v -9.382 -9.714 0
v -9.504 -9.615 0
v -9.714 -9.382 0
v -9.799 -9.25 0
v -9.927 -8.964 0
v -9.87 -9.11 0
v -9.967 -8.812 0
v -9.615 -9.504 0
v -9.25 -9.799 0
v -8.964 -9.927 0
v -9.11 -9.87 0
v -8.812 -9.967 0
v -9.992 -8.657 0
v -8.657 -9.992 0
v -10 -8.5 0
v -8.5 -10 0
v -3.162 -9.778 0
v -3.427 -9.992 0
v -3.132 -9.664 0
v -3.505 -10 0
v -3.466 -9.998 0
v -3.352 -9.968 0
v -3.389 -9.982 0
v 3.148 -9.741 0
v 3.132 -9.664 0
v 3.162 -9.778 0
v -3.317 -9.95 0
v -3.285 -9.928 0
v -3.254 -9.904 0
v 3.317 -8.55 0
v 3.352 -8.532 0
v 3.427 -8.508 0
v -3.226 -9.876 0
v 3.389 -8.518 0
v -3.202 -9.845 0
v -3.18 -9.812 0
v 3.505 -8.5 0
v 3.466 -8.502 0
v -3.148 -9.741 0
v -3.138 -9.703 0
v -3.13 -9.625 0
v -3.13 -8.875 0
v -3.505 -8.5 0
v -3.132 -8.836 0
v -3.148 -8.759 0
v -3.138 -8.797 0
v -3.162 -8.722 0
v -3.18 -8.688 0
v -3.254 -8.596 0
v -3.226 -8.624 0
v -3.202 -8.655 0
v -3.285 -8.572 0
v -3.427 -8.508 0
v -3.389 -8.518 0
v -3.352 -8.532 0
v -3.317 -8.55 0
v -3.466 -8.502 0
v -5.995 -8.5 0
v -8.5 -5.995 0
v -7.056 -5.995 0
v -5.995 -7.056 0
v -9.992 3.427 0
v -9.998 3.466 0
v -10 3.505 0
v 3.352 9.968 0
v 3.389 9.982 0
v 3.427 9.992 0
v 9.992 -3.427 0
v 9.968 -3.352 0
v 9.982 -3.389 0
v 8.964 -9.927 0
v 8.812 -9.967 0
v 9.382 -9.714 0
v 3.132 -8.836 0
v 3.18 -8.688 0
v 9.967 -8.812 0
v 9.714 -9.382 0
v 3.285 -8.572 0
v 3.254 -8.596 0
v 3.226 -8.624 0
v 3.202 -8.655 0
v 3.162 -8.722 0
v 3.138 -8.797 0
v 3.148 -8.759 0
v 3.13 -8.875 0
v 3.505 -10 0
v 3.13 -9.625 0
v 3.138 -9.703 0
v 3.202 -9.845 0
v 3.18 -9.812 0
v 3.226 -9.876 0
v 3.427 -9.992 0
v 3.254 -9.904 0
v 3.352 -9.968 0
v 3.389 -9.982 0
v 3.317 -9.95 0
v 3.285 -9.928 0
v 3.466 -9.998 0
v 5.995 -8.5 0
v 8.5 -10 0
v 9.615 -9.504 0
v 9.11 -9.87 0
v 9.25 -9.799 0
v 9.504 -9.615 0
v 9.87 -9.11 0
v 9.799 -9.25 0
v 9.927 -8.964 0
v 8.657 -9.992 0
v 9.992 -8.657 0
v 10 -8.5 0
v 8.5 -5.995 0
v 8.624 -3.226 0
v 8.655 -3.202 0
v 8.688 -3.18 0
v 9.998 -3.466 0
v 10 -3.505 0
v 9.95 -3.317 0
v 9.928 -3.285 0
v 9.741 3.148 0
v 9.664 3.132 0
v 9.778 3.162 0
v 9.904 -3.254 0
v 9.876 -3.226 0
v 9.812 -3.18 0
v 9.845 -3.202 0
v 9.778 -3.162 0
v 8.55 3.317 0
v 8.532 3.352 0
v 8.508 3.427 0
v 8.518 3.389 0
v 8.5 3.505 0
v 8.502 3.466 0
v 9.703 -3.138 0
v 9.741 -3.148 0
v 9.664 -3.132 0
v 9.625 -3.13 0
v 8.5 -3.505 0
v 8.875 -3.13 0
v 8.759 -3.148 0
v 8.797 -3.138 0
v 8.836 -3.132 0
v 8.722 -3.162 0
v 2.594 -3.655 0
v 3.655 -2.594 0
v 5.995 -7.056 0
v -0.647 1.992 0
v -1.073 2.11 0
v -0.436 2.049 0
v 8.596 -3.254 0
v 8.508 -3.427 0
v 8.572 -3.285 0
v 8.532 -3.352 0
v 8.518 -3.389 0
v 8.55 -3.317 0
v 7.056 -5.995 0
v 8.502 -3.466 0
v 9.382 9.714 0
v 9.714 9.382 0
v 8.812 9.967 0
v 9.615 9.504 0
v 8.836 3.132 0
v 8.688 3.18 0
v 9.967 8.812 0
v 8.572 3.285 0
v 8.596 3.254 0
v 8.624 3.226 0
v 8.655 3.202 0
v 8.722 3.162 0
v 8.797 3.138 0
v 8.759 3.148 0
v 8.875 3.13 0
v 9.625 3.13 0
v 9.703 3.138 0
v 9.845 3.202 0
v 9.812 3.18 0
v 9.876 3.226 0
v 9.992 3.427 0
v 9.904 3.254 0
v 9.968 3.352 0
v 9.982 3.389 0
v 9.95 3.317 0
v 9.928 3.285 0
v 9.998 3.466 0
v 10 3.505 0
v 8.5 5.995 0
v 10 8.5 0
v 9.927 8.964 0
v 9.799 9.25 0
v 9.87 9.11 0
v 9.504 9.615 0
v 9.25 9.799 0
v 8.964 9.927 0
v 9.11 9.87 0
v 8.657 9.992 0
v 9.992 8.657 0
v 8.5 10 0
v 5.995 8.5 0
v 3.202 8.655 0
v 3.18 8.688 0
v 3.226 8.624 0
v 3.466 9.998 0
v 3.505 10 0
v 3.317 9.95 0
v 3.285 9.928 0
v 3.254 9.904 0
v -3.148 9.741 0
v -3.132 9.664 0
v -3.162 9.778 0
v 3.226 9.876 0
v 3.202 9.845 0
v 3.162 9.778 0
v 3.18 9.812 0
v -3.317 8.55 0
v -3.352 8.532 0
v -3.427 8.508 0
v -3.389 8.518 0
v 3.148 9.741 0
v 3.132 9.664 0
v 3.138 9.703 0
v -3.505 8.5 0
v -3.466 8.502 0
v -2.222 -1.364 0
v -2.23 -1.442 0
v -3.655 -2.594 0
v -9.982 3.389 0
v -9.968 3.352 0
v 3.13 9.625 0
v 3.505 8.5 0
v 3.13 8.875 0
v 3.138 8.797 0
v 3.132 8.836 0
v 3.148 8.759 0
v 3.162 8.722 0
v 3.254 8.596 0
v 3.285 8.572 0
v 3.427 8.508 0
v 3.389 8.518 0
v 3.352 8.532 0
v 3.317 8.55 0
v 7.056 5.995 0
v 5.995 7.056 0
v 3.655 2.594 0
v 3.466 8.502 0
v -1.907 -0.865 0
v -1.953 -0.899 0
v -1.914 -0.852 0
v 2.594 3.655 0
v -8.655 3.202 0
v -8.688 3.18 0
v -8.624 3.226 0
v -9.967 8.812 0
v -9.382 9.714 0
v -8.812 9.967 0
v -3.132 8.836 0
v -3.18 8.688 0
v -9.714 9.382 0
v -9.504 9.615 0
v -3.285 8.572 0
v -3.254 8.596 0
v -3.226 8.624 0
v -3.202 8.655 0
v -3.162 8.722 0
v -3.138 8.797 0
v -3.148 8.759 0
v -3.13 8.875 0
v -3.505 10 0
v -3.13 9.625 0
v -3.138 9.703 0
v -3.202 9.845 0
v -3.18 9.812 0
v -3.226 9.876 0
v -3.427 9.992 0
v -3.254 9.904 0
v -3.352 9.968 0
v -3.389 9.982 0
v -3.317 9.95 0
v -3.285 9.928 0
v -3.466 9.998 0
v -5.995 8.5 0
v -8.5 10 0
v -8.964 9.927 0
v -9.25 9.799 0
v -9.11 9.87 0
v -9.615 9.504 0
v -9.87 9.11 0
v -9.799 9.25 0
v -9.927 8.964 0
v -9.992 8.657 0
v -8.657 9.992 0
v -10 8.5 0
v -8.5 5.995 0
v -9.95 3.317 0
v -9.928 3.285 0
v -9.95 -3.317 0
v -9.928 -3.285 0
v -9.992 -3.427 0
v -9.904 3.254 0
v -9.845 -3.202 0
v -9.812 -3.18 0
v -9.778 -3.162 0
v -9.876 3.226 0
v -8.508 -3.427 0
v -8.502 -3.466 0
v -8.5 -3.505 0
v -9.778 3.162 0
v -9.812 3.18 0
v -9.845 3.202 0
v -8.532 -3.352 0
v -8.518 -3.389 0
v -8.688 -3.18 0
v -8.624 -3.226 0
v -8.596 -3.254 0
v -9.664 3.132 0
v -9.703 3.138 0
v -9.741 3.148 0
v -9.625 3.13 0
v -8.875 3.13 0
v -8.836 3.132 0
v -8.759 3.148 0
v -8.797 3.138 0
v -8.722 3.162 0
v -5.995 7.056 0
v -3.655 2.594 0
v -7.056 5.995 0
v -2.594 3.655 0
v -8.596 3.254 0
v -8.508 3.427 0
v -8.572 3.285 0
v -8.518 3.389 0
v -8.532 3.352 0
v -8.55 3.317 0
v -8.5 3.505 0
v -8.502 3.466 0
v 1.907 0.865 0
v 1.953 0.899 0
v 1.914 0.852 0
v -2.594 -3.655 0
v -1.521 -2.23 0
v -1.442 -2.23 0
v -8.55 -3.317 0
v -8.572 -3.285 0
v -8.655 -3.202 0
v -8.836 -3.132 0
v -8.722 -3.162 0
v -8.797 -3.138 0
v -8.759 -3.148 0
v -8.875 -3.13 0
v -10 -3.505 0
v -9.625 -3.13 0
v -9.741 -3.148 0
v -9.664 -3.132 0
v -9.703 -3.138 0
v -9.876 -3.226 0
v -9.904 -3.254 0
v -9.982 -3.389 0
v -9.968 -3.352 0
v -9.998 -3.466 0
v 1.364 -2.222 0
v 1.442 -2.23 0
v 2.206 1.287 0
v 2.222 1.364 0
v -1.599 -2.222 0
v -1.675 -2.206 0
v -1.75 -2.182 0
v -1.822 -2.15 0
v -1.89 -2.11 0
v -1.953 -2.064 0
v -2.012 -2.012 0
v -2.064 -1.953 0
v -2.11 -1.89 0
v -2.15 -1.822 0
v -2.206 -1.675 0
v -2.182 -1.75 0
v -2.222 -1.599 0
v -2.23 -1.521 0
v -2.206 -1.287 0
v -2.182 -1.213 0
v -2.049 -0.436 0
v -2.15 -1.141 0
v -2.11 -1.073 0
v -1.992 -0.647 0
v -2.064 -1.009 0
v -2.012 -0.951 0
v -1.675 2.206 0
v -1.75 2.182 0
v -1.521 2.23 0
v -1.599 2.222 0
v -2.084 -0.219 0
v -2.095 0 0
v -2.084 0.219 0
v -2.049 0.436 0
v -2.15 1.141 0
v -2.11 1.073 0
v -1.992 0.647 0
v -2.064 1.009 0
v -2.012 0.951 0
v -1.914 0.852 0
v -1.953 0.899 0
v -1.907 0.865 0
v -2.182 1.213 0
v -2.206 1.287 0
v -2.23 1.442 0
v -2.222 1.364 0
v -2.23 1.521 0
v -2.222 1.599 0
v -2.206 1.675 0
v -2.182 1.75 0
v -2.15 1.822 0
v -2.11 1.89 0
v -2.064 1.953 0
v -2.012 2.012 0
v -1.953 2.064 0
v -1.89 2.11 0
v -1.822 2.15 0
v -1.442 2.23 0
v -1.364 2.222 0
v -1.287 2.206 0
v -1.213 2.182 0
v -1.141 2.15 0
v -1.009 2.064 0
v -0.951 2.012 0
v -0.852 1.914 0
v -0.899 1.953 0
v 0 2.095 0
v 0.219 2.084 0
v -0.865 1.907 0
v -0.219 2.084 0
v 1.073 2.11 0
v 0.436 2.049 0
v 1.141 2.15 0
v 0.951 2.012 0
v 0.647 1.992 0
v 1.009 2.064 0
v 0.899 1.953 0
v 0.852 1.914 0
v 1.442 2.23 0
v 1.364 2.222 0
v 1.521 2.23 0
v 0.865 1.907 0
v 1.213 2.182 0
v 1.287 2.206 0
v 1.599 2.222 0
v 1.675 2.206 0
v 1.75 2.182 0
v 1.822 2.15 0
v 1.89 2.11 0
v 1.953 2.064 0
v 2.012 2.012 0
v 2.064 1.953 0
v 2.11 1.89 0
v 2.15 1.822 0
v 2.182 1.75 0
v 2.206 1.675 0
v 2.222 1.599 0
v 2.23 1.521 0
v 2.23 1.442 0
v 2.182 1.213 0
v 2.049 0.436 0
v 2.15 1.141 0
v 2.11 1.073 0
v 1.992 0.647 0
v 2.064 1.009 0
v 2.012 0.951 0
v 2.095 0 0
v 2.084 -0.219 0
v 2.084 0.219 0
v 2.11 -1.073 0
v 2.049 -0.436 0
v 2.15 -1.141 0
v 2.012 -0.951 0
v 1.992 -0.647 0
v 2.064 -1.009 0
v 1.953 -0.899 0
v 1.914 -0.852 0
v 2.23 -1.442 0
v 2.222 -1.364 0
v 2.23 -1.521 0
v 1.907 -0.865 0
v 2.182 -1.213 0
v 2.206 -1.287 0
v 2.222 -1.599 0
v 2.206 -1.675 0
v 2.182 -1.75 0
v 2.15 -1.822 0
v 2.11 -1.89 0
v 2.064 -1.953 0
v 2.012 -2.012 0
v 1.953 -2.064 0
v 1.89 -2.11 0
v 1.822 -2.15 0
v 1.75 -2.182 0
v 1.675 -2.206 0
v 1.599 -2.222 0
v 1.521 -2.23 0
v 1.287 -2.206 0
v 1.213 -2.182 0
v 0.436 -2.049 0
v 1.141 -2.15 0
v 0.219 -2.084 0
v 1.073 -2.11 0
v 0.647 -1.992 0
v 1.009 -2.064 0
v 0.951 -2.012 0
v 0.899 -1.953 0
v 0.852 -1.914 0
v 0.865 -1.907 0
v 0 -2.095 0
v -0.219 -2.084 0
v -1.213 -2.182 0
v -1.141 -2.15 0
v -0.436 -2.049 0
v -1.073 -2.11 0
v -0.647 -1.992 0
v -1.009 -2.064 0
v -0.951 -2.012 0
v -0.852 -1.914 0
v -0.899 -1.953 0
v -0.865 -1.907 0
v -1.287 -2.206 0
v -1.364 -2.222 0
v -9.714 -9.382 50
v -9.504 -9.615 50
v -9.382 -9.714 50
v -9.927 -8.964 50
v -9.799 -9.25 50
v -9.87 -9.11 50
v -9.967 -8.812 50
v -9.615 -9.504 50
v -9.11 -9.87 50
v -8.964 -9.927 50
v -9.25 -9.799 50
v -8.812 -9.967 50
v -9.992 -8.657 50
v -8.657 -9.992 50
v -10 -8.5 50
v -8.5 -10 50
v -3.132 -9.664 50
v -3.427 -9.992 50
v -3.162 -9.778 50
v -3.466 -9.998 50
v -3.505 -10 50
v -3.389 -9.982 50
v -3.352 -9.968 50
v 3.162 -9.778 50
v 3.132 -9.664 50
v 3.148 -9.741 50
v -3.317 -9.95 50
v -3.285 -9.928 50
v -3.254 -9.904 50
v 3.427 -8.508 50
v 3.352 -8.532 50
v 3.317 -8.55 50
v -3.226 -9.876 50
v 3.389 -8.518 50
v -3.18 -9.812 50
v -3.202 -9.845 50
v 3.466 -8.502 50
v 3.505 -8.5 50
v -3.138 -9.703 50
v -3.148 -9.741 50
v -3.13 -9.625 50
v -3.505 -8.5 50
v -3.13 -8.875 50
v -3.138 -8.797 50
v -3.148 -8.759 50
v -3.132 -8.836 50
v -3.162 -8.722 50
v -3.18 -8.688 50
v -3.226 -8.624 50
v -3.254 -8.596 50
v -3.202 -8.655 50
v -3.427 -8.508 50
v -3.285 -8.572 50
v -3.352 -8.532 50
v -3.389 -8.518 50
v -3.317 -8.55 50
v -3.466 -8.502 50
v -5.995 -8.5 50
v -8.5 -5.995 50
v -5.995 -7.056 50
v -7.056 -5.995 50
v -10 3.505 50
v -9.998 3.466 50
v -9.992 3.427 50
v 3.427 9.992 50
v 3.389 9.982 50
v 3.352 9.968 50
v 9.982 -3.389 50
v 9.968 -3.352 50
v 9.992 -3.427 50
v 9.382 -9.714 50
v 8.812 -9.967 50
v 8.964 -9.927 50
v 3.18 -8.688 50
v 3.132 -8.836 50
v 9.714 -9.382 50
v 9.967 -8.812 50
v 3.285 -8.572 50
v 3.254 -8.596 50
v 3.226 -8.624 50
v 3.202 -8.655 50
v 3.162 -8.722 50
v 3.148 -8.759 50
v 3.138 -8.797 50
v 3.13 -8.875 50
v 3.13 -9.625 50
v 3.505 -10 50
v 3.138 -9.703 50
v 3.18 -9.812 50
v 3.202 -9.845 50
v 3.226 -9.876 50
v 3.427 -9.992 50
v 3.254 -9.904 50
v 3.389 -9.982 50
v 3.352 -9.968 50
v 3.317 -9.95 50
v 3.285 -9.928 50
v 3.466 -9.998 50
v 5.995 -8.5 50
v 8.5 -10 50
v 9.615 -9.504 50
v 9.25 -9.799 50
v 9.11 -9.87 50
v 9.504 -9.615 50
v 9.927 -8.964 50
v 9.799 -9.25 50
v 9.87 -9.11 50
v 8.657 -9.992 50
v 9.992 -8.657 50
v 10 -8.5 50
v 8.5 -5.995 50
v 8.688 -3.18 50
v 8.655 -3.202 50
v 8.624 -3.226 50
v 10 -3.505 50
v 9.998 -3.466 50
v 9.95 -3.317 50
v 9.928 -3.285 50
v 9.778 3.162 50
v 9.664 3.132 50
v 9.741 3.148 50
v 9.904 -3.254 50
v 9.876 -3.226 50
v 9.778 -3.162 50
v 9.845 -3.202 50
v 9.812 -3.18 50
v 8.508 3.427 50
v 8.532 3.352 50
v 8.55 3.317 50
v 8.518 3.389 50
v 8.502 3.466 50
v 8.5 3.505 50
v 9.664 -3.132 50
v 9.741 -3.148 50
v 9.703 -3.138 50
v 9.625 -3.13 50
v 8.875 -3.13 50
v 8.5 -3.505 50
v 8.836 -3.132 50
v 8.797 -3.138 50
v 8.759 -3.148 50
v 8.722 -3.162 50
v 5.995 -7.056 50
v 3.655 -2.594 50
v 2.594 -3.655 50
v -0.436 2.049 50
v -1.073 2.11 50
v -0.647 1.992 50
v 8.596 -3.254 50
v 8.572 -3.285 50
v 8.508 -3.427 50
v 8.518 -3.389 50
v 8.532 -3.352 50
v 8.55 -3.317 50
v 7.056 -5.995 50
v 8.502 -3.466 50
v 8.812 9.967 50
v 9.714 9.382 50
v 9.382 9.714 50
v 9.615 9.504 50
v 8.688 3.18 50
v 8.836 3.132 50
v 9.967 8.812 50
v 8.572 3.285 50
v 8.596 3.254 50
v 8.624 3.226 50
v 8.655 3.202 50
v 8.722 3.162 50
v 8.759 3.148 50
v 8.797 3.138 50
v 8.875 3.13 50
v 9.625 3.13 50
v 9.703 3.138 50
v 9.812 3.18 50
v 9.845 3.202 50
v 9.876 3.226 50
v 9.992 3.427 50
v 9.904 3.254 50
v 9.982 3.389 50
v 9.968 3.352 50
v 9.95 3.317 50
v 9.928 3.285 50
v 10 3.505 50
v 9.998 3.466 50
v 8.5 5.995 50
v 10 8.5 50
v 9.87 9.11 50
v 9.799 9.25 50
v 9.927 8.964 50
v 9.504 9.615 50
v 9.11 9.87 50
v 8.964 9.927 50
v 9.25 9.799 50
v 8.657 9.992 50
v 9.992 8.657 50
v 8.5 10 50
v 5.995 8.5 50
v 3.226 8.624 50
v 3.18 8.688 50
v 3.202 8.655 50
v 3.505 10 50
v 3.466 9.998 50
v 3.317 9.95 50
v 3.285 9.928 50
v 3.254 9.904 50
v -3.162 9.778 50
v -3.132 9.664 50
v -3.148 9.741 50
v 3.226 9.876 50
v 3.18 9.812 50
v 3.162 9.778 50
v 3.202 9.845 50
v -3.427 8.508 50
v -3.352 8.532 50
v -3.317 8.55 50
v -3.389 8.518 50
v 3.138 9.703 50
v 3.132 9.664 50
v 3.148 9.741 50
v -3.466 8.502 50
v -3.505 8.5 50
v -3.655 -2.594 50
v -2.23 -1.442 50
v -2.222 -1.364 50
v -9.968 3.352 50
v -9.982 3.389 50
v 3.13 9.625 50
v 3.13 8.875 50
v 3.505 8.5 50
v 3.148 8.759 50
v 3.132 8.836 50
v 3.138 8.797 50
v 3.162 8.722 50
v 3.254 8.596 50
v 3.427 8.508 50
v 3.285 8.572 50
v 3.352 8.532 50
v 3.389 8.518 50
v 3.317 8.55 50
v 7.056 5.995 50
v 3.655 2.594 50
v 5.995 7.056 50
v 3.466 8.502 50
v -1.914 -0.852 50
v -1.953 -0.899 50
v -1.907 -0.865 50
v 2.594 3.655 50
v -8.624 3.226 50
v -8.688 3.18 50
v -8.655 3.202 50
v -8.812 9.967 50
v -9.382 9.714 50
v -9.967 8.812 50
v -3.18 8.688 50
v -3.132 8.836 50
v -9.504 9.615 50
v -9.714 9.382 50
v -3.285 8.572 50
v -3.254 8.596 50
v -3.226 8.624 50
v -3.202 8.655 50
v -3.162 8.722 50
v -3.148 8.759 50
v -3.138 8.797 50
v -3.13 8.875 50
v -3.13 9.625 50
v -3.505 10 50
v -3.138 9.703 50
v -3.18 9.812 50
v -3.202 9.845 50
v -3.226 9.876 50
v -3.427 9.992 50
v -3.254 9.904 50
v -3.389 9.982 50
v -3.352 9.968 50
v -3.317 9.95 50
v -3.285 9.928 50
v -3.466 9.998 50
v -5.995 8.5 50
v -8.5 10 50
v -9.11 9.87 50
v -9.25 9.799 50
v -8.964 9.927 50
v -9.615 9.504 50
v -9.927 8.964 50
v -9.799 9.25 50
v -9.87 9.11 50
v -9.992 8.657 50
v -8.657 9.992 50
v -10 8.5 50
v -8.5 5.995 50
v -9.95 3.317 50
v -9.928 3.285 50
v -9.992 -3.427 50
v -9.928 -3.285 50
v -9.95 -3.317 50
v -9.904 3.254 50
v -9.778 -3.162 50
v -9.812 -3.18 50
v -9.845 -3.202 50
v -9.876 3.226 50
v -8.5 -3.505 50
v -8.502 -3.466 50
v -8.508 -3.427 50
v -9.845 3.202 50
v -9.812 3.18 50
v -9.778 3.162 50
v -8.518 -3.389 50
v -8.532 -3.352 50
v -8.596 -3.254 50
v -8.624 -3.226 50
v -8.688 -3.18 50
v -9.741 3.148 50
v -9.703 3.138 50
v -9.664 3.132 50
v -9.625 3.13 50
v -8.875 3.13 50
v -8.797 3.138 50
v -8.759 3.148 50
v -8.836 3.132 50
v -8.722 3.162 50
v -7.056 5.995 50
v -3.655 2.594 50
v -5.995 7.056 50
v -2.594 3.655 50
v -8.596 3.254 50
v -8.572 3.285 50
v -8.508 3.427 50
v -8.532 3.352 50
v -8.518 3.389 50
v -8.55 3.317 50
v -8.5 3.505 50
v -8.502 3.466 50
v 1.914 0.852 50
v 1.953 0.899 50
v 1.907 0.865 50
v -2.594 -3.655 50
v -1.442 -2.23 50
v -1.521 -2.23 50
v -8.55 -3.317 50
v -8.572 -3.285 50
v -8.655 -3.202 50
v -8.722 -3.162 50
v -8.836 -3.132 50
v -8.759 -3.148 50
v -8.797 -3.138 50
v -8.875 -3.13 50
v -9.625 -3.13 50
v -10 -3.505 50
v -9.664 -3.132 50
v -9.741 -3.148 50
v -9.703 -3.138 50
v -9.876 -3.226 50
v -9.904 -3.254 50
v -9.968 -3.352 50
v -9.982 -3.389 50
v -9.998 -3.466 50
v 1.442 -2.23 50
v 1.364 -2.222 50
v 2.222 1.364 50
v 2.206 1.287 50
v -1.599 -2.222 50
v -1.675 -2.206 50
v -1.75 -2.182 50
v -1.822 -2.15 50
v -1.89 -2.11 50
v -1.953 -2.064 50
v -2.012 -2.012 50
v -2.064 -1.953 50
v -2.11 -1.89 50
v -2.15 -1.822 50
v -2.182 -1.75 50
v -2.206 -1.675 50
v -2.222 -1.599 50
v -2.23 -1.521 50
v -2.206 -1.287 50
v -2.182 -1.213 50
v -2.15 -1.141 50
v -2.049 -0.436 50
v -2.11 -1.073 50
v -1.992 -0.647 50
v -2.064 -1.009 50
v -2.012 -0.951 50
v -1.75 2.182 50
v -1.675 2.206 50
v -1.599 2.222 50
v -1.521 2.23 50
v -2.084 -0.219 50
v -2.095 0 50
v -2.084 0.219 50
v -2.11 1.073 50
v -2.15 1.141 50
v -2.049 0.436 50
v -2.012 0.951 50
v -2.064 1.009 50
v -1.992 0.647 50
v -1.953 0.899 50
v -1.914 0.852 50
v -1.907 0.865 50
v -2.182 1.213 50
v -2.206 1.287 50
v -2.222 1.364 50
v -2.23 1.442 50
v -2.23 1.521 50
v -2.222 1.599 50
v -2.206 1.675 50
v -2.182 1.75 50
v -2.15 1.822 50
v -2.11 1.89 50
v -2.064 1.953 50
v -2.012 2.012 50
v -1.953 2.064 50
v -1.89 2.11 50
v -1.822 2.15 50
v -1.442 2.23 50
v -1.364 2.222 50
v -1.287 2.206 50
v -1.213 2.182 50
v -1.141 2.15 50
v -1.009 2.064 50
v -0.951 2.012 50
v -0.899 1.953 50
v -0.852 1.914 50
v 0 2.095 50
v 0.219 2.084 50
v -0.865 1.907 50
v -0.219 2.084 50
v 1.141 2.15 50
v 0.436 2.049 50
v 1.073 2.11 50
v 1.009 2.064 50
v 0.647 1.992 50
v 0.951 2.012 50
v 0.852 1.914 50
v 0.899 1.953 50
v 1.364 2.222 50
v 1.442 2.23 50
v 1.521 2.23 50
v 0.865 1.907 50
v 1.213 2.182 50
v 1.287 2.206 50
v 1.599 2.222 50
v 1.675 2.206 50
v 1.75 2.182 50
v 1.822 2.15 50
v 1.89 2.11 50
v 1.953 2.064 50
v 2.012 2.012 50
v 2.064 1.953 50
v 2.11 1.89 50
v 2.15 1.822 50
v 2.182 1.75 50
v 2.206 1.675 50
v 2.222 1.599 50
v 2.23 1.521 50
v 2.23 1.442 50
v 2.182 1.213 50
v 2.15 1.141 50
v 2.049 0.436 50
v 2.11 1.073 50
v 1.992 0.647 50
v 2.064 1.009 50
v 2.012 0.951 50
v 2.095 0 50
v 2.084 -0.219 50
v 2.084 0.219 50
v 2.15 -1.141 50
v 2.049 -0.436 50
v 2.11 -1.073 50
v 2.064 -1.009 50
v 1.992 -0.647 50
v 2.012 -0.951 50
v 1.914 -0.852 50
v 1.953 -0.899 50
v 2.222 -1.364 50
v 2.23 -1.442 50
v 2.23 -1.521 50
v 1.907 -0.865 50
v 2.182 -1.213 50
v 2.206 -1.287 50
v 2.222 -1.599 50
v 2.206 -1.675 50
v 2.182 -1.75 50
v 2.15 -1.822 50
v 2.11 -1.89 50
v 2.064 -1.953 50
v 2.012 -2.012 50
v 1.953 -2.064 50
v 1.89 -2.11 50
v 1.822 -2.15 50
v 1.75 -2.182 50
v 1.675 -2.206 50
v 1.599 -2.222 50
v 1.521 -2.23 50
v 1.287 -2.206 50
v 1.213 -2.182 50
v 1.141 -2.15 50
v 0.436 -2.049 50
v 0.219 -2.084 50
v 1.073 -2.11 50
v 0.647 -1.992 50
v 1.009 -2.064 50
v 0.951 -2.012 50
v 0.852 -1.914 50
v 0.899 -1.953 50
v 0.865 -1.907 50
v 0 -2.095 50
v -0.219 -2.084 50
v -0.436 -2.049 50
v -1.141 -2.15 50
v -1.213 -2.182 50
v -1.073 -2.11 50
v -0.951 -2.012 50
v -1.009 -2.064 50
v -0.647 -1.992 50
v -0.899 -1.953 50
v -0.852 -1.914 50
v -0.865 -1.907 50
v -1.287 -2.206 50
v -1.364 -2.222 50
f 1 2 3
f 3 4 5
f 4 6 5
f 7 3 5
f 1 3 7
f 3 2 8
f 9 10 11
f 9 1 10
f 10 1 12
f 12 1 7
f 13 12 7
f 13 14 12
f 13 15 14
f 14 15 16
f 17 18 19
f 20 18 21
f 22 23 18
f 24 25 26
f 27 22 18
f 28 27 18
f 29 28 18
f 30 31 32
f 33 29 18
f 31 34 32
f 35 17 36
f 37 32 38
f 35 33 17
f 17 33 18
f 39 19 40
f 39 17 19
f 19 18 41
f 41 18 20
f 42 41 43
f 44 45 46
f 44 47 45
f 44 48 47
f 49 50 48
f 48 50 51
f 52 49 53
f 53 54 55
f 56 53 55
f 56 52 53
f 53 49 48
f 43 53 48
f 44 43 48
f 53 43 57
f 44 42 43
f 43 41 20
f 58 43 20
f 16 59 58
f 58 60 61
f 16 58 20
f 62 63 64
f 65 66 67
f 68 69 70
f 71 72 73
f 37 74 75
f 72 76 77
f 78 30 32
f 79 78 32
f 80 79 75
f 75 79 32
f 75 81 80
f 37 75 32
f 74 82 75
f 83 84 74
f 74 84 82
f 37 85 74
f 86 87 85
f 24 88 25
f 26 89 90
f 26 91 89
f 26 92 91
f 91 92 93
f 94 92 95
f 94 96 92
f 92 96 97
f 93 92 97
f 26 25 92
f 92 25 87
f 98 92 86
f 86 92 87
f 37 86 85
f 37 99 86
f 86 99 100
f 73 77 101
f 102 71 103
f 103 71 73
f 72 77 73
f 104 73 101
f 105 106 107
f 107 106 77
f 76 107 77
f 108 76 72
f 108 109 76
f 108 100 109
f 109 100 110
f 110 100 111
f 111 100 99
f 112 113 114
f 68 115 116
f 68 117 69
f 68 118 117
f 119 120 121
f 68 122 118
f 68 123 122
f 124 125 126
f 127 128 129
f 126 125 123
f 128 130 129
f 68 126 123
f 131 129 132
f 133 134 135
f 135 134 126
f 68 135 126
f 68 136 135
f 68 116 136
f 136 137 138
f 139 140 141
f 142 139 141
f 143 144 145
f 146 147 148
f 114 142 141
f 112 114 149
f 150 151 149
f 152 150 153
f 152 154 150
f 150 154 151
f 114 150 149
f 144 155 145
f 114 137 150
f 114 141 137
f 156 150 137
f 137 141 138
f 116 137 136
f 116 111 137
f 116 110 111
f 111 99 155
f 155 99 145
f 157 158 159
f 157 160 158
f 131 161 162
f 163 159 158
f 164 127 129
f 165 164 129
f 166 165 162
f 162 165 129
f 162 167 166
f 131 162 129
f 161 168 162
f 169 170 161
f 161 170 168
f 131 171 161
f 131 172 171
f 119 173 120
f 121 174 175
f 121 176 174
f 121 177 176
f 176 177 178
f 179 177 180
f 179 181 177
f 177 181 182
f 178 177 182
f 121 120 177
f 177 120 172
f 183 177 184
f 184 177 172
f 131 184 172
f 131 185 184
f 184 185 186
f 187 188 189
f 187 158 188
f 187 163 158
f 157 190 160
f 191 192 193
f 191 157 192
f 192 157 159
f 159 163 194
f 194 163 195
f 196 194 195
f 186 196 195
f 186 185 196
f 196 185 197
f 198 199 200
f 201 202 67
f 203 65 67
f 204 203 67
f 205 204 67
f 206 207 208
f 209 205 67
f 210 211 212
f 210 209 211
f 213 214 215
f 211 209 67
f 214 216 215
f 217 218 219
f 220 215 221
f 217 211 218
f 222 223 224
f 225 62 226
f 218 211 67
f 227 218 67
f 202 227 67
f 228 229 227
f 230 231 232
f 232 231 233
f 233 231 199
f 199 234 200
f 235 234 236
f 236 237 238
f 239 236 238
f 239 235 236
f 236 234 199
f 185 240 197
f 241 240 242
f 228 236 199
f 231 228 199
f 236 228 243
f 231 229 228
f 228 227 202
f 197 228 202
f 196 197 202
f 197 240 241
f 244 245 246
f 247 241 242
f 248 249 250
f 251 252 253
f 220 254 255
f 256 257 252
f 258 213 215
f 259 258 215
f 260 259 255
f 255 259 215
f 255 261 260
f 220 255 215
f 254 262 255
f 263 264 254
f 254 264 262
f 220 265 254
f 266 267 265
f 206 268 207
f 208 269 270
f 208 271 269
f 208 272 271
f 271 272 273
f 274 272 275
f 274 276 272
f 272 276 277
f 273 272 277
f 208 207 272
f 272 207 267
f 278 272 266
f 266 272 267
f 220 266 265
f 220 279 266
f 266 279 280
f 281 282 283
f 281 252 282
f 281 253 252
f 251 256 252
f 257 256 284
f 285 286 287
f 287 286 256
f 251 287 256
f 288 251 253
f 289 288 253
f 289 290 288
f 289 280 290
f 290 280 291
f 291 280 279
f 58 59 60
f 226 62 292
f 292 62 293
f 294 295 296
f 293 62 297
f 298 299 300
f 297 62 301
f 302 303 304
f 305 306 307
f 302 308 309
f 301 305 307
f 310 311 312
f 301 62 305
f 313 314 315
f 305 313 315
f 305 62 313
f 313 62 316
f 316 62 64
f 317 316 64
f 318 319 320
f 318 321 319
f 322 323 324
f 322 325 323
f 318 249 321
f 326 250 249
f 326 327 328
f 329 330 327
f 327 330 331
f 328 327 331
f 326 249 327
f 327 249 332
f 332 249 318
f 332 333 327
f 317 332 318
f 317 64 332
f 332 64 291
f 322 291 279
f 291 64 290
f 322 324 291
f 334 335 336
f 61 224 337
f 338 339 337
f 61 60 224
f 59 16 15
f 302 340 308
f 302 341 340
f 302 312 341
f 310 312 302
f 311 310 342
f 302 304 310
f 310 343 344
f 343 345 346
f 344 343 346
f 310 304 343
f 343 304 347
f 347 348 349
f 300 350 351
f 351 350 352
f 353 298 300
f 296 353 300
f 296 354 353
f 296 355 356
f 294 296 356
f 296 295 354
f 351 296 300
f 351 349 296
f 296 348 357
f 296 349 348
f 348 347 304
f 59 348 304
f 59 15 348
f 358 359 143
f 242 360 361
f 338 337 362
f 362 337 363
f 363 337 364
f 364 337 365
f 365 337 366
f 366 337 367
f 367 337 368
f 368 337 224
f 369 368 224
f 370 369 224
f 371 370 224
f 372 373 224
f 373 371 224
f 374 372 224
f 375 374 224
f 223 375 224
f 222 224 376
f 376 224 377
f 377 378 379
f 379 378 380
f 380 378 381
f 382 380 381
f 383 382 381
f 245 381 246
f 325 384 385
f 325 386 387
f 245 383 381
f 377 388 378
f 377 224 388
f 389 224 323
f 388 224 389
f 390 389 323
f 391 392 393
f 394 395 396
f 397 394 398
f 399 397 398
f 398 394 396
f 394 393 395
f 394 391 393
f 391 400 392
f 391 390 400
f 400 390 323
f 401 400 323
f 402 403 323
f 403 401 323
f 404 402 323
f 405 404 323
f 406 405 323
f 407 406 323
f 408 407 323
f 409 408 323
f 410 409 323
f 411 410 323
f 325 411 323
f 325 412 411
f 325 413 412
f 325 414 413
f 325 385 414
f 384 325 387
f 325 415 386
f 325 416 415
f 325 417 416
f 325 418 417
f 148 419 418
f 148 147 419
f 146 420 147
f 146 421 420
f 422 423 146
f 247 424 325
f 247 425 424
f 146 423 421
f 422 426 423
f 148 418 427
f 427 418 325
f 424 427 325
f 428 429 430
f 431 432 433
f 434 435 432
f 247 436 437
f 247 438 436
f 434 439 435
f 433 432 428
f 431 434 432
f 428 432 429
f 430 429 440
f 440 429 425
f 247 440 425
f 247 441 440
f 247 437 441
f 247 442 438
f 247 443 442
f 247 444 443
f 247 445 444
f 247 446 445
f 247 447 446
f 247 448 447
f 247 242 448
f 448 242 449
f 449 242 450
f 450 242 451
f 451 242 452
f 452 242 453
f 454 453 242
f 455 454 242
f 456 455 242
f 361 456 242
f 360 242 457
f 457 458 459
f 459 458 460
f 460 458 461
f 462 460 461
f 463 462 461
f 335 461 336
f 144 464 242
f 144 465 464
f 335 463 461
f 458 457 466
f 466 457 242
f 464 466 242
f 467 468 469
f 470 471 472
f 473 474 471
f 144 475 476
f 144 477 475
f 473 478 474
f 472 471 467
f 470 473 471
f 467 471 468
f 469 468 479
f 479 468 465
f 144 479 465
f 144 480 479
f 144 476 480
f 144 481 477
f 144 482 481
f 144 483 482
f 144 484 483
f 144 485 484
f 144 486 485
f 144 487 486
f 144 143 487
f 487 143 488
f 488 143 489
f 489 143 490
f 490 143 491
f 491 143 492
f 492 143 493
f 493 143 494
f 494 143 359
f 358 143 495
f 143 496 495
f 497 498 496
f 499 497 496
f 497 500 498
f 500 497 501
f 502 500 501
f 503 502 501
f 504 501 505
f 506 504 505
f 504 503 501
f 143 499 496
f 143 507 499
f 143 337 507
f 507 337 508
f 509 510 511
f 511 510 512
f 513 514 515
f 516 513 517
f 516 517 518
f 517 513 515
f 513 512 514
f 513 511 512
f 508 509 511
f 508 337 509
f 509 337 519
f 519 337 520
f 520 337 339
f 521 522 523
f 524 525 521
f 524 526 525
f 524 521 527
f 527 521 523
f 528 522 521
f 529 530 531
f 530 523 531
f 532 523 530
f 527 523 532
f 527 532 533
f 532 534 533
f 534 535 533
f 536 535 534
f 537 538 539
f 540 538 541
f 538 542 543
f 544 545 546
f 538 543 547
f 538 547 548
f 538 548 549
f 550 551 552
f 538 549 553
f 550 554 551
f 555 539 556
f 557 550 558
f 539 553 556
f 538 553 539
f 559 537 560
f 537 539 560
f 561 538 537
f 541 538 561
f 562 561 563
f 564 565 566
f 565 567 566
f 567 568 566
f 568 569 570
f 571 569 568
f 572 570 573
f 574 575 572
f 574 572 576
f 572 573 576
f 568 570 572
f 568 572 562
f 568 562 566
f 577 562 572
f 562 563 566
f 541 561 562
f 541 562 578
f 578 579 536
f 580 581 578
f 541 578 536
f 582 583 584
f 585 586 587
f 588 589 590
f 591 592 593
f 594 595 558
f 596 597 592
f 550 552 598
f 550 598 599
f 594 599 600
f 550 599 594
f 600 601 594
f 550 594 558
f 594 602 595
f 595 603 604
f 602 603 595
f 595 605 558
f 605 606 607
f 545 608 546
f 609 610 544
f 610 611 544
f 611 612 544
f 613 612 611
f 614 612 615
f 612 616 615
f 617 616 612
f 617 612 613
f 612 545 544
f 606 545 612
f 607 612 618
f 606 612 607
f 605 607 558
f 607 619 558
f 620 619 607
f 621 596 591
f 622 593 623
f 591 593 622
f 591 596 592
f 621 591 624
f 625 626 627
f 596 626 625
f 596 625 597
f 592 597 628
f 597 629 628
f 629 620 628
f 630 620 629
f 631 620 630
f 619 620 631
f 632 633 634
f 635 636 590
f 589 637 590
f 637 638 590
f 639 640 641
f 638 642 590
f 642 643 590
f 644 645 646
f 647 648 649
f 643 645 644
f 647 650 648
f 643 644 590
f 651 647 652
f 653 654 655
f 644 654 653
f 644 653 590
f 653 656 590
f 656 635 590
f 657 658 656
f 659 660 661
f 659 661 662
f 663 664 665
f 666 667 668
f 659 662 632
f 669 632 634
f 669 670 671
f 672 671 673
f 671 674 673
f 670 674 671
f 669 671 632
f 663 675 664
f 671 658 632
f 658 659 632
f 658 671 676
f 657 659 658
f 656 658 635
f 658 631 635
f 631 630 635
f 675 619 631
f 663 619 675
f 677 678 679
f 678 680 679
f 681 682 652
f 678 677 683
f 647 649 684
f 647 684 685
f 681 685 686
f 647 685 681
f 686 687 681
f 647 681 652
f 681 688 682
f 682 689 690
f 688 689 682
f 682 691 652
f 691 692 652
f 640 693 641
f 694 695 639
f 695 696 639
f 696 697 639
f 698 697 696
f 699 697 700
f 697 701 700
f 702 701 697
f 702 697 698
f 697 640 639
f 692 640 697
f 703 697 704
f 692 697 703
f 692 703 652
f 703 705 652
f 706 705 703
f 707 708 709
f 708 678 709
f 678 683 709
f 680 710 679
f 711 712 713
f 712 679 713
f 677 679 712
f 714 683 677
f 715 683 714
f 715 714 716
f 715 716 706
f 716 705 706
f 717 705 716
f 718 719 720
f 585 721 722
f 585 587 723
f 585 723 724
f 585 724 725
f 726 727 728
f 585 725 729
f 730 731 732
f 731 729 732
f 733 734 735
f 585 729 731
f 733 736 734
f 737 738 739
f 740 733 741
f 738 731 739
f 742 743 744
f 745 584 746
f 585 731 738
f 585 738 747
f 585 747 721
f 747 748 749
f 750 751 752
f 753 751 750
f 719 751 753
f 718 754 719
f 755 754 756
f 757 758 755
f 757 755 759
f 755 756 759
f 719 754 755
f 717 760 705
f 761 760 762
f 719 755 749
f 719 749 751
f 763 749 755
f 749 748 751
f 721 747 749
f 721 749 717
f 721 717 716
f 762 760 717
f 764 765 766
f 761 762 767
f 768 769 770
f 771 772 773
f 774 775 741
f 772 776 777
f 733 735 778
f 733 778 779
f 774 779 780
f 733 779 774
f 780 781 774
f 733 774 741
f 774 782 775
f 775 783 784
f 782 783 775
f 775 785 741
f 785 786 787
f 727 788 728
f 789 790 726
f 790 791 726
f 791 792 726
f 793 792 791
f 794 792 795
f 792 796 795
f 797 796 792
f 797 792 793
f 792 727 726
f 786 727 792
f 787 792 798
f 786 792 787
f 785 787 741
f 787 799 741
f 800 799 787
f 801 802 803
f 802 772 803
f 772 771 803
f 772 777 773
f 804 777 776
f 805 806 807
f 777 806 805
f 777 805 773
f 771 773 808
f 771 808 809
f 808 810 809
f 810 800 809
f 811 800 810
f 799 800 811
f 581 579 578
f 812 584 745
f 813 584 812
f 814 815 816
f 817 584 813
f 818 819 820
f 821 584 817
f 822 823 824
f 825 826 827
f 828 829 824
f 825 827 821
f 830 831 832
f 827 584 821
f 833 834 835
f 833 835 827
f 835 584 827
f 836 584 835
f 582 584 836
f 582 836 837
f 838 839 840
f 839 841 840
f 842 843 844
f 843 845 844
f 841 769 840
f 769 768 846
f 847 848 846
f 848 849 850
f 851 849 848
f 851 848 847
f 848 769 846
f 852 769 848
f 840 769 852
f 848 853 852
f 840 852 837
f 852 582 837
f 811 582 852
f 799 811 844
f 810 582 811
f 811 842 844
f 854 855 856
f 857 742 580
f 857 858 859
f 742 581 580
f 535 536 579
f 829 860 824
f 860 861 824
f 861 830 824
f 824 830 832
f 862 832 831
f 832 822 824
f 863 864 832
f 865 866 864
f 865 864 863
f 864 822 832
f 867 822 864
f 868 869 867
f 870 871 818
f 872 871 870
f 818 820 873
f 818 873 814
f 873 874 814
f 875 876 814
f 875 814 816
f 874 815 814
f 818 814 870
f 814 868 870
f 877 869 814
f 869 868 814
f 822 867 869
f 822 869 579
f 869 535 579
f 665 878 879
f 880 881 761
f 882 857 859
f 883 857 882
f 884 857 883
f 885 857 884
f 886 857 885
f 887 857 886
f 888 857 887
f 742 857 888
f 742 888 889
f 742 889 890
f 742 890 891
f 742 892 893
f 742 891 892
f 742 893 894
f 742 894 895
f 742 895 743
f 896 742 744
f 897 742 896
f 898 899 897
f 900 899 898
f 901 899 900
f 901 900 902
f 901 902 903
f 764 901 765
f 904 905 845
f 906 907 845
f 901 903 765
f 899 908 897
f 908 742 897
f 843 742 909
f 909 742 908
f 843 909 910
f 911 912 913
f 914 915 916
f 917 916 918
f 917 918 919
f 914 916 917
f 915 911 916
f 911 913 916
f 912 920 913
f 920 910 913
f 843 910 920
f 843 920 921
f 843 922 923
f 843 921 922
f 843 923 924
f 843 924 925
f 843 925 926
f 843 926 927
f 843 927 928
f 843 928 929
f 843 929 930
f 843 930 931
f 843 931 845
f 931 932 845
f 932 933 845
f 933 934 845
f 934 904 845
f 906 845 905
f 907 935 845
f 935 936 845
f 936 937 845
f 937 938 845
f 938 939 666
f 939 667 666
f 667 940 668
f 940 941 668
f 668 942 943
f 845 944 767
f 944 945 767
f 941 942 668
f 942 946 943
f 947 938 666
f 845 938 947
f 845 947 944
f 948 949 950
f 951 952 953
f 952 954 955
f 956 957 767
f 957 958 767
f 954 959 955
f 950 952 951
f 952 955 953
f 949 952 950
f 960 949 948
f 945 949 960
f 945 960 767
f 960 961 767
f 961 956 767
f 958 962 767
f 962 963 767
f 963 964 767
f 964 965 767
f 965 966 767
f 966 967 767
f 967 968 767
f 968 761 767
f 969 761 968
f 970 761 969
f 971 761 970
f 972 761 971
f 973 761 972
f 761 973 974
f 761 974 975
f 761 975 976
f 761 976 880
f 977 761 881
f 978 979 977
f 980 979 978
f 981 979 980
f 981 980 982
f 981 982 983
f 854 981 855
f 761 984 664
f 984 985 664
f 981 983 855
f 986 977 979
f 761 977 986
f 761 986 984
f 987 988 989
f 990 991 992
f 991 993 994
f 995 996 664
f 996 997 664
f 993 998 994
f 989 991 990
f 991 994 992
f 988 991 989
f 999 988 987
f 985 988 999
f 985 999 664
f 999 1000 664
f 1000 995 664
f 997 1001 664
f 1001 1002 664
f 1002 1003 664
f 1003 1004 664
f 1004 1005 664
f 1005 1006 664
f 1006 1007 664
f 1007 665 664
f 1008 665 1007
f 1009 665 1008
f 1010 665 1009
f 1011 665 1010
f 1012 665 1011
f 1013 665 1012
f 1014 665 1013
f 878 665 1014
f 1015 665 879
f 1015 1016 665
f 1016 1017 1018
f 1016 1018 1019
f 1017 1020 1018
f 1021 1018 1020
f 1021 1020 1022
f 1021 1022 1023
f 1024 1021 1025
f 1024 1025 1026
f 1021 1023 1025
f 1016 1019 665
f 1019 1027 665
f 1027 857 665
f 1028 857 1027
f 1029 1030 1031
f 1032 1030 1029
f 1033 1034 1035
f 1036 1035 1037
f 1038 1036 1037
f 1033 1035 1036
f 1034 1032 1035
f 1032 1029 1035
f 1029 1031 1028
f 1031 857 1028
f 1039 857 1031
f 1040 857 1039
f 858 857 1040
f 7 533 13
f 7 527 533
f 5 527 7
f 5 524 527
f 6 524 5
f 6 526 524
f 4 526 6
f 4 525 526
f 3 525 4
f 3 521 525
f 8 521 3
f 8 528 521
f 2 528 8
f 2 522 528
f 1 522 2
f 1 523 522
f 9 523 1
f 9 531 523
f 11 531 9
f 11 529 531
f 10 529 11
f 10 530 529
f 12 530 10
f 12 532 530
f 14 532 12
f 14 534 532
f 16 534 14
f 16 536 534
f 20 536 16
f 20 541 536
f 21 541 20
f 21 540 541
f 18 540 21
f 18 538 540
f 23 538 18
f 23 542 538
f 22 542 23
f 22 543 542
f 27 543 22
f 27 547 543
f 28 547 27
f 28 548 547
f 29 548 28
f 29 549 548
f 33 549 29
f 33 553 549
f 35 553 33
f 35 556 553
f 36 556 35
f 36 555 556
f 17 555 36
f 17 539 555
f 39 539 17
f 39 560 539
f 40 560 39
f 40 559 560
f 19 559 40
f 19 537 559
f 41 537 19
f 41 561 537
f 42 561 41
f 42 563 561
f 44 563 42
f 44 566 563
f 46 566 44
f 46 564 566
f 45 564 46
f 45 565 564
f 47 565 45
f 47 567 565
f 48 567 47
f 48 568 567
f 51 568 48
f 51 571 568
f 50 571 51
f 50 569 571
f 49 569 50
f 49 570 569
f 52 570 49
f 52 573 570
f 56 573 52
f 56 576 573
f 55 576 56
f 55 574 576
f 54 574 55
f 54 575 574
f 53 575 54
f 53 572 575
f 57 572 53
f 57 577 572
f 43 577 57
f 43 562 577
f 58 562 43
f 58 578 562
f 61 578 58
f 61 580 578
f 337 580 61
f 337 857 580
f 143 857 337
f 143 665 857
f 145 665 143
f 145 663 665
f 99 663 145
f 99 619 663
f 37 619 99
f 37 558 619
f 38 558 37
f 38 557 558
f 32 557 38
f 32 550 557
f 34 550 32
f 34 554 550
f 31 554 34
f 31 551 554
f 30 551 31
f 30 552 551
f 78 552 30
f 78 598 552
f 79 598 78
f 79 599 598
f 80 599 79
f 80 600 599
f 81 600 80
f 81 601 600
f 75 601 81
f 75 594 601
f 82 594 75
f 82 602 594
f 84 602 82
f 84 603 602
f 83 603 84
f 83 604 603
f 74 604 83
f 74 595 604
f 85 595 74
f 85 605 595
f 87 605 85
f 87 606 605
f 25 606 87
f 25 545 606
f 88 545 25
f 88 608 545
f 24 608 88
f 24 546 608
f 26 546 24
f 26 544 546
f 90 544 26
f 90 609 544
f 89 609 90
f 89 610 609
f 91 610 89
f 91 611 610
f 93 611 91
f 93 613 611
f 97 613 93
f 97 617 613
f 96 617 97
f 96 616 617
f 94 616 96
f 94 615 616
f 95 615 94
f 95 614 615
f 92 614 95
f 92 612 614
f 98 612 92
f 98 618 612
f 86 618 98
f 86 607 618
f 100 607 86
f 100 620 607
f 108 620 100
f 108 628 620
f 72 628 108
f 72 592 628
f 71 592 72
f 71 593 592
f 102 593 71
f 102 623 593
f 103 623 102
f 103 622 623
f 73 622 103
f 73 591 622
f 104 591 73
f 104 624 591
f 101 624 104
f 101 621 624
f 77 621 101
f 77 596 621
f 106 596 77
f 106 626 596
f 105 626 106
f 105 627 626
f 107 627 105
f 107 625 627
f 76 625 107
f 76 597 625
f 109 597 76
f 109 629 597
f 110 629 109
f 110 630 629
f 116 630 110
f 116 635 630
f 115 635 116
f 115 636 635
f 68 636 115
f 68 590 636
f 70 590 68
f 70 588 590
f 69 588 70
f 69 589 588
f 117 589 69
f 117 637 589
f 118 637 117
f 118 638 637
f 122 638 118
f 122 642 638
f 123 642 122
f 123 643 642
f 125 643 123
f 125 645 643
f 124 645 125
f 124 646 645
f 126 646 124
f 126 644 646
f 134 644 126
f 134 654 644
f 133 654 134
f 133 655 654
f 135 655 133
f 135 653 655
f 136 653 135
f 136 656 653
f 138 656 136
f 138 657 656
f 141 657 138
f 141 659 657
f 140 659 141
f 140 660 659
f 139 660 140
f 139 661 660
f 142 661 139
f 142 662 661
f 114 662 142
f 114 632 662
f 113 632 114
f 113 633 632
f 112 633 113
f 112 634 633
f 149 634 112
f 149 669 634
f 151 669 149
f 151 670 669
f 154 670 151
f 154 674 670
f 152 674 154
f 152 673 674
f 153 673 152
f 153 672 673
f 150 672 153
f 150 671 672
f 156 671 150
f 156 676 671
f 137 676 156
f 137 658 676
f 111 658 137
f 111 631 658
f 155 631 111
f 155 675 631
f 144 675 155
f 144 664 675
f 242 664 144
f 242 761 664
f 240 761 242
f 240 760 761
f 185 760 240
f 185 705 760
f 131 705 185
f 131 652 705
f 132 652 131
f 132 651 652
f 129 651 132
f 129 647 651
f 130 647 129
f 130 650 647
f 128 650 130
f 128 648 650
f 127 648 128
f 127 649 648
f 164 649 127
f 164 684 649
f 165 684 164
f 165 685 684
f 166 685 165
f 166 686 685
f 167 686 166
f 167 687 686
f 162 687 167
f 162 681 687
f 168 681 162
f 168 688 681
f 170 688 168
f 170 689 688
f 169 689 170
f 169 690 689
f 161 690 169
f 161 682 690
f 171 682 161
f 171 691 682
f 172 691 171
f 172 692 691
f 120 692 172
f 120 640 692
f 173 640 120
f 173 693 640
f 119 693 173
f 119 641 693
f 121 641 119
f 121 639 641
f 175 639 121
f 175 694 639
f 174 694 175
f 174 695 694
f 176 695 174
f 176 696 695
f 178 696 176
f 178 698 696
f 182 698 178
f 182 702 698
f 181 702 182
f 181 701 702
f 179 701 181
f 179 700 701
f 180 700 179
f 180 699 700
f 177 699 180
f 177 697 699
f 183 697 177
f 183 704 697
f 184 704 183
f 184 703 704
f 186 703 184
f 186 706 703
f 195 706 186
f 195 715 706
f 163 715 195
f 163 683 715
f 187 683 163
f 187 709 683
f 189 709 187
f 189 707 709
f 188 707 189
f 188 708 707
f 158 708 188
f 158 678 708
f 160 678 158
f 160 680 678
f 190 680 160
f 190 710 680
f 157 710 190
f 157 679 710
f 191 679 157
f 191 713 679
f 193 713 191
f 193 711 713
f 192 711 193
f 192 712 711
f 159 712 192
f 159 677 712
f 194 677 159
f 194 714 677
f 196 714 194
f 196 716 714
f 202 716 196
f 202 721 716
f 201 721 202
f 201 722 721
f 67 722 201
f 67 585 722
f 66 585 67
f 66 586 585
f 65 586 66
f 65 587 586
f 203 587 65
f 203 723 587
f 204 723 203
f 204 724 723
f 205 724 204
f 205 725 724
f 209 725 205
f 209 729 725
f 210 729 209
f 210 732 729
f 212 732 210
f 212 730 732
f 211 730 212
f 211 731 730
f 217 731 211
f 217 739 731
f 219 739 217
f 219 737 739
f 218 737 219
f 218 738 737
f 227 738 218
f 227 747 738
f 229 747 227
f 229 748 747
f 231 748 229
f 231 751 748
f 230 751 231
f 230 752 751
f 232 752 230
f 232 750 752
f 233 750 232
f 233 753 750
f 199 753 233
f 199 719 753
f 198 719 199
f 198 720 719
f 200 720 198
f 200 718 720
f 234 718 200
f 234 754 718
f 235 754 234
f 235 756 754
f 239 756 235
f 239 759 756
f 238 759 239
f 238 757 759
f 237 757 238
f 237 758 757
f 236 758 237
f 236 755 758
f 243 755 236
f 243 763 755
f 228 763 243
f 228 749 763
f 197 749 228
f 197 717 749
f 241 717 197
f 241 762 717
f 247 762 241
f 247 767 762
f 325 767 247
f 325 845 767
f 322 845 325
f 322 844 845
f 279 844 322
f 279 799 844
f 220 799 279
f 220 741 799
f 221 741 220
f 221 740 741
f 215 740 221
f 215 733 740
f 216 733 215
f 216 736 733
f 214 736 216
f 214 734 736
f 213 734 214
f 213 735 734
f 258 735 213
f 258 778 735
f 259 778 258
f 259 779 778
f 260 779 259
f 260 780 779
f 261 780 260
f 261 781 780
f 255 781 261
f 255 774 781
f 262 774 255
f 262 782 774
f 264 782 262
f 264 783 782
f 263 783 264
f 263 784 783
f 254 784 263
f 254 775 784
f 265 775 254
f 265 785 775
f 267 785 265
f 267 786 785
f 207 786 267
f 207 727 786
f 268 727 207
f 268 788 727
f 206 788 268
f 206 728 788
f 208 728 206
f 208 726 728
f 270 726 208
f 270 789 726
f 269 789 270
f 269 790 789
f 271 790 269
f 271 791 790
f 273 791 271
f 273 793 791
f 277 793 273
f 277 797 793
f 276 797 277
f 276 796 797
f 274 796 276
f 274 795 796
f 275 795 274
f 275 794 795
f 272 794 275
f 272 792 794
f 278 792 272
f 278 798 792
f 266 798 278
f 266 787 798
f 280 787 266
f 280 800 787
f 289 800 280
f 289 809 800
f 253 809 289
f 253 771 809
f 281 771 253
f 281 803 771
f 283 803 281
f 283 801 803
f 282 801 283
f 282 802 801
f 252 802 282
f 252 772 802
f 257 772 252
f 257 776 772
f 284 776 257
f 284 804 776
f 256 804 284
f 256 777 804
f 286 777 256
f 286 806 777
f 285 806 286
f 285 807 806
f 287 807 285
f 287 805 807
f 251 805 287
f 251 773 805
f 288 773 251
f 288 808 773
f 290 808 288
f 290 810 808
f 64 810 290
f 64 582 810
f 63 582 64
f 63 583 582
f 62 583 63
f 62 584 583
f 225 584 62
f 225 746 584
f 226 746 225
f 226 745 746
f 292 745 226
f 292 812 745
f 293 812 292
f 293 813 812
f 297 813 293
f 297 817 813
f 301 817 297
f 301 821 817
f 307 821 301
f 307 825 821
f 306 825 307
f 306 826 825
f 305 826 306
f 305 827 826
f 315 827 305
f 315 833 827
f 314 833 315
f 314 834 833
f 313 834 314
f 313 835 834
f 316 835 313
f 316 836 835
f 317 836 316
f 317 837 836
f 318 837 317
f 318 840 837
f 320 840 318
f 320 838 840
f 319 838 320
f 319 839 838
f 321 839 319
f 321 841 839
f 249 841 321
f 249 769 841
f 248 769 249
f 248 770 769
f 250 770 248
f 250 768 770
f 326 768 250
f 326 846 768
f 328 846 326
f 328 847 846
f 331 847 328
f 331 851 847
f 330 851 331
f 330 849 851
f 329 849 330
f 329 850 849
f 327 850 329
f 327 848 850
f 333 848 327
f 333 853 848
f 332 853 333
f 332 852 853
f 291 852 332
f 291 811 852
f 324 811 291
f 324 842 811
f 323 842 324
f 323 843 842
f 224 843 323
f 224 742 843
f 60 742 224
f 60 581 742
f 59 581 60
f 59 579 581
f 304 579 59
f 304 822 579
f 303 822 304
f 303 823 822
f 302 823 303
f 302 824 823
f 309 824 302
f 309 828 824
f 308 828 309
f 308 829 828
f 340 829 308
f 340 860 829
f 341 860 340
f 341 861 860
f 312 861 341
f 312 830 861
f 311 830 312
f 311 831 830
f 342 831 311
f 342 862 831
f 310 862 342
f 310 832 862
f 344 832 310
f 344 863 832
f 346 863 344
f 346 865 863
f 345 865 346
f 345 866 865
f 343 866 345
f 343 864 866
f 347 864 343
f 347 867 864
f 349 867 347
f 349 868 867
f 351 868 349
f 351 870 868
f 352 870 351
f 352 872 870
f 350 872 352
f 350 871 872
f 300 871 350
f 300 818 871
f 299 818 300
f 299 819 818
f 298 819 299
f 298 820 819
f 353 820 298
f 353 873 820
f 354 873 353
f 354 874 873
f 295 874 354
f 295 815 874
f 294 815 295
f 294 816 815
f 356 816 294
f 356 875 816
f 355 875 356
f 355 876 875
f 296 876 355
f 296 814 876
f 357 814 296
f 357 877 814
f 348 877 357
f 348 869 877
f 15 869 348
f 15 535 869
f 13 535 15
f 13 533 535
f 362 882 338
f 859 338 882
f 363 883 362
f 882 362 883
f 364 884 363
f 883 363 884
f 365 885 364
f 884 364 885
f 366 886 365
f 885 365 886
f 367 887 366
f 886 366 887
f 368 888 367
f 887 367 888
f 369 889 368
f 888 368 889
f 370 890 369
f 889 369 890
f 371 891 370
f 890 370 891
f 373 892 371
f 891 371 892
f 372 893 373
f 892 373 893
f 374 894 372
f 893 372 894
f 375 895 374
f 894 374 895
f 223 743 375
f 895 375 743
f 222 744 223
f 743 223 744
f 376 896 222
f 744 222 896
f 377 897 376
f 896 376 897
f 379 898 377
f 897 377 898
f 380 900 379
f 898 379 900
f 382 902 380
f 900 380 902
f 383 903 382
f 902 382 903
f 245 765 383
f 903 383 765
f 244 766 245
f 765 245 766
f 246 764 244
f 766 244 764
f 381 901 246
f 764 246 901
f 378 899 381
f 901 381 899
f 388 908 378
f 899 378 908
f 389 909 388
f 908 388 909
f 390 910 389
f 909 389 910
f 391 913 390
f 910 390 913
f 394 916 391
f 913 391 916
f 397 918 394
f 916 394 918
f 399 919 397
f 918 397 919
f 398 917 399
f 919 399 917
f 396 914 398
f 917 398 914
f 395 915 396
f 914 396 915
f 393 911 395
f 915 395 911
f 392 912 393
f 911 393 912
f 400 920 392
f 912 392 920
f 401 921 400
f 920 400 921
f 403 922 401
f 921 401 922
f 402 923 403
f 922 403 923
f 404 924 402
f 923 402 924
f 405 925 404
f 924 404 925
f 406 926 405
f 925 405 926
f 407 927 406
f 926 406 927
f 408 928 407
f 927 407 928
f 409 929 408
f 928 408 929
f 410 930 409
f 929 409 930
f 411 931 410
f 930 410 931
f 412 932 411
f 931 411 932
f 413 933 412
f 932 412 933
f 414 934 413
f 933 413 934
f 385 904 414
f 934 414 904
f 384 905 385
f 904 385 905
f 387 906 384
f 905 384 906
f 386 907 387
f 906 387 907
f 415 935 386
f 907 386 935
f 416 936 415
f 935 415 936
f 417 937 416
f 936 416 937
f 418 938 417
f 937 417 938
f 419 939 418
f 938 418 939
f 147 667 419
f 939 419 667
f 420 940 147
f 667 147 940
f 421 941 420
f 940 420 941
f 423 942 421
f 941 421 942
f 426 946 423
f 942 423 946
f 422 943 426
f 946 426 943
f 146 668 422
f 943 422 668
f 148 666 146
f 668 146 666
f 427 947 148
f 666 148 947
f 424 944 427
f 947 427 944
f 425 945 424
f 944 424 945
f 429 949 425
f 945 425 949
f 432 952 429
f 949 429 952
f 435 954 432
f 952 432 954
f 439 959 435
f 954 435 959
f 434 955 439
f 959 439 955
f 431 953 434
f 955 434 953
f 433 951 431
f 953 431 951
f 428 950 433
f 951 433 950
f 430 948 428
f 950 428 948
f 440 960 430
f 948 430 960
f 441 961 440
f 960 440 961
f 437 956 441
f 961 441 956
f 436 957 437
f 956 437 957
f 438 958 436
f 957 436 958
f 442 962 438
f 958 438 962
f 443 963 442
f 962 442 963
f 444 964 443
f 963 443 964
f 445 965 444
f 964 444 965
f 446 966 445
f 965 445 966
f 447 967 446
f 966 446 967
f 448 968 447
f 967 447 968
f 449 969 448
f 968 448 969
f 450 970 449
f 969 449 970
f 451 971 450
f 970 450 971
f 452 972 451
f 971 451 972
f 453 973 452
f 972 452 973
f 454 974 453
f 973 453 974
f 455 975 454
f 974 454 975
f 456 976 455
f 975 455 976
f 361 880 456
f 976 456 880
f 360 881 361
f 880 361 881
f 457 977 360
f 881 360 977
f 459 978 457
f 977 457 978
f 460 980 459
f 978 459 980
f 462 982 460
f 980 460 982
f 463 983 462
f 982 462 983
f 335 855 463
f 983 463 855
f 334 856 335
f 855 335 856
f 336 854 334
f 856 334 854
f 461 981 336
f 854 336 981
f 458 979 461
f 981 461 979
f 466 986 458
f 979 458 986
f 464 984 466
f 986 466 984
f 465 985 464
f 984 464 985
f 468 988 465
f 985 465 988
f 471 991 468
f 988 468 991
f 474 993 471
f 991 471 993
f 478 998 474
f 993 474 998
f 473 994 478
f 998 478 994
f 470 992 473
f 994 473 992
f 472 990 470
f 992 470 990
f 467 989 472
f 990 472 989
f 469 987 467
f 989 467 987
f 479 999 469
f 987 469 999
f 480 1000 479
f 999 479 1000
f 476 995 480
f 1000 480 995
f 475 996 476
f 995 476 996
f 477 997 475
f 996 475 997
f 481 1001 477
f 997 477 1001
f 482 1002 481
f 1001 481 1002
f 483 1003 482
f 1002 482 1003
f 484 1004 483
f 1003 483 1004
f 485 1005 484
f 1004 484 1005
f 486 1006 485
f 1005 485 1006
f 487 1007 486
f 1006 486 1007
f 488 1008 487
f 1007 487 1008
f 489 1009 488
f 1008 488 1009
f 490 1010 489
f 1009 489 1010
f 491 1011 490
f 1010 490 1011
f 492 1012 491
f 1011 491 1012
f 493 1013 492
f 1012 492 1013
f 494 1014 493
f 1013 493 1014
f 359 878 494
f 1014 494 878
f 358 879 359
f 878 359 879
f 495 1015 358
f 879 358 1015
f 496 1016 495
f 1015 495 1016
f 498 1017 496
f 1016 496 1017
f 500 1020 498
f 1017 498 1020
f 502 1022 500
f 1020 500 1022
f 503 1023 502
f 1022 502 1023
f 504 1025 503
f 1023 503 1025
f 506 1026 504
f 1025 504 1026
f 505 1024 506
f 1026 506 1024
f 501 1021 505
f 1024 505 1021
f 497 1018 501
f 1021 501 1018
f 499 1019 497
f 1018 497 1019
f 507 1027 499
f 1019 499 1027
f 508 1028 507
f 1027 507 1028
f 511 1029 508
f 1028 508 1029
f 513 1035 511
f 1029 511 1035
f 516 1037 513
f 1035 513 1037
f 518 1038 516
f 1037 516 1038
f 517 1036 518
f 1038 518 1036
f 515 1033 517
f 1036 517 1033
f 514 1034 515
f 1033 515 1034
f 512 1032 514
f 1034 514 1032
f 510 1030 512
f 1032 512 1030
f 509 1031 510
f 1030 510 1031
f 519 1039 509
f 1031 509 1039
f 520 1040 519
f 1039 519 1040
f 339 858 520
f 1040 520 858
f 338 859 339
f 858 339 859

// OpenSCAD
/*
 * 2020profile.scad
 * v1.0.2 21st December 2017
 * Written by landie @ Thingiverse (Dave White)
 *
 * This script is licensed under the Creative Commons - Attribution license.
 * https://www.thingiverse.com/thing:2722504
 *
 * A parametised and customizable profile generator for 2020 and 2040 profiles
 * v1.0 2020 and 2040 profiles
 * v1.0.1 added 2080 profile
 * v1.0.2 made slot width customizable
 */
 
// The type of extrusion, 2020 or 2040
extrusionSize = "2020"; // [2020, 2040, 2080]

// The length of the extrusion
extrusionLength = 50;  // [1:300]

// The slot gap width
slotWidth = 6; //[4,5,6,7,8]

// The radius of the extrusion outer 4 corners
cornerRadius = 1.5;

// The diameter of the hole in the center(s) of the profile
centerDia = 4.19;

// The gap at the outside edge of each slot
slotGap = slotWidth + 0.26;

// The width at the largest point of each slot
slotMax = 11.99;

// The width and height of the square in the center of each profile
centerSquare = 7.31;

// The thickness of the walls that make up most of the profile
wallThickness = 1.5;

// The width of the profile(s)
extrusionWidth = 20;

// The height of the profile(s)
extrusionHeight = 20;

/* [Hidden] */

if (extrusionSize == "2020") {
    linear_extrude(extrusionLength)
    profile2020();
}

if (extrusionSize == "2040") {
    linear_extrude(extrusionLength)
    profile2040();
}

if (extrusionSize == "2080") {
    linear_extrude(extrusionLength)
    profile2080();
}

module profile2020() {
    difference() {
        hull() {
            translate([-extrusionWidth / 2 + cornerRadius, extrusionHeight / 2 - cornerRadius])
            circle(r=cornerRadius, $fn = 60);
            translate([extrusionWidth / 2 - cornerRadius, extrusionHeight / 2 - cornerRadius])
            circle(r=cornerRadius, $fn = 60);
            translate([-extrusionWidth / 2 + cornerRadius, -extrusionHeight / 2 + cornerRadius])
            circle(r=cornerRadius, $fn = 60);
            translate([extrusionWidth / 2 - cornerRadius, -extrusionHeight / 2 + cornerRadius])
            circle(r=cornerRadius, $fn = 60);
        }
        circle(d = centerDia, $fn = 60);
        for (angle = [45, 135, 225, 315]) {
            rotate(angle)
            translate([0, centerDia / 2])
            circle(d = wallThickness, $fn = 60);
        }
        for (angle = [0,90,180,270]) {
            rotate(angle)
            slot();
        }
    }
}

module profile2040() {
    difference() {
        union() {
            translate([0,extrusionHeight / 2])
                profile2020();
            translate([0,-extrusionHeight / 2])
                profile2020();
            roundedSquare(wallThickness / 4, extrusionWidth, slotGap);
        }
        joinerCutout();
    }
}

module profile2080() {
    difference() {
        union() {
            translate([0,extrusionHeight])
                profile2040();
            translate([0,-extrusionHeight])
                profile2040();
            roundedSquare(wallThickness / 4, extrusionWidth, slotGap);
        }
        joinerCutout();
    }
}

module joinerCutout() {
        centerGap = ((extrusionWidth - slotMax) / 2 - wallThickness) * 2;
        roundedSquare(wallThickness / 4, extrusionWidth - wallThickness * 2, centerGap);
        difference() {
            circle(d = extrusionWidth - wallThickness, $fn = 4);
            roundedSquare(wallThickness / 4, extrusionWidth, centerGap);
            translate([0, extrusionHeight / 2])
            roundedSquare(wallThickness / 4, centerSquare, centerSquare);
            translate([0, -extrusionHeight / 2])
            roundedSquare(wallThickness / 4, centerSquare, centerSquare);
        }
}

module slot() {
    totalHeight = extrusionHeight / 2 - centerSquare / 2;
    difference() {
        translate([0,totalHeight / 2 + centerSquare / 2])
        square([slotMax, totalHeight], center = true);
        rotate(45)
            square([wallThickness, extrusionHeight * 1.5], center = true);
        rotate(-45)
            square([wallThickness, extrusionHeight * 1.5], center = true);
        translate([-extrusionWidth / 4 - slotGap / 2, totalHeight + centerSquare / 2 - wallThickness / 2])
            roundedSquare(wallThickness / 4, extrusionWidth / 2, wallThickness);
        translate([extrusionWidth / 4 + slotGap / 2, totalHeight + centerSquare / 2 - wallThickness / 2])
            roundedSquare(wallThickness / 4, extrusionWidth / 2, wallThickness);
    }
}

module roundedSquare(radius, width, height) {
    hull() {
        translate([width / 2 - radius, height / 2 - radius])
        circle(r = radius, $fn = 60);
        translate([-width / 2 + radius, height / 2 - radius])
        circle(r = radius, $fn = 60);
        translate([width / 2 - radius, -height / 2 + radius])
        circle(r = radius, $fn = 60);
        translate([-width / 2 + radius, -height / 2 + radius])
        circle(r = radius, $fn = 60);
    }
}
